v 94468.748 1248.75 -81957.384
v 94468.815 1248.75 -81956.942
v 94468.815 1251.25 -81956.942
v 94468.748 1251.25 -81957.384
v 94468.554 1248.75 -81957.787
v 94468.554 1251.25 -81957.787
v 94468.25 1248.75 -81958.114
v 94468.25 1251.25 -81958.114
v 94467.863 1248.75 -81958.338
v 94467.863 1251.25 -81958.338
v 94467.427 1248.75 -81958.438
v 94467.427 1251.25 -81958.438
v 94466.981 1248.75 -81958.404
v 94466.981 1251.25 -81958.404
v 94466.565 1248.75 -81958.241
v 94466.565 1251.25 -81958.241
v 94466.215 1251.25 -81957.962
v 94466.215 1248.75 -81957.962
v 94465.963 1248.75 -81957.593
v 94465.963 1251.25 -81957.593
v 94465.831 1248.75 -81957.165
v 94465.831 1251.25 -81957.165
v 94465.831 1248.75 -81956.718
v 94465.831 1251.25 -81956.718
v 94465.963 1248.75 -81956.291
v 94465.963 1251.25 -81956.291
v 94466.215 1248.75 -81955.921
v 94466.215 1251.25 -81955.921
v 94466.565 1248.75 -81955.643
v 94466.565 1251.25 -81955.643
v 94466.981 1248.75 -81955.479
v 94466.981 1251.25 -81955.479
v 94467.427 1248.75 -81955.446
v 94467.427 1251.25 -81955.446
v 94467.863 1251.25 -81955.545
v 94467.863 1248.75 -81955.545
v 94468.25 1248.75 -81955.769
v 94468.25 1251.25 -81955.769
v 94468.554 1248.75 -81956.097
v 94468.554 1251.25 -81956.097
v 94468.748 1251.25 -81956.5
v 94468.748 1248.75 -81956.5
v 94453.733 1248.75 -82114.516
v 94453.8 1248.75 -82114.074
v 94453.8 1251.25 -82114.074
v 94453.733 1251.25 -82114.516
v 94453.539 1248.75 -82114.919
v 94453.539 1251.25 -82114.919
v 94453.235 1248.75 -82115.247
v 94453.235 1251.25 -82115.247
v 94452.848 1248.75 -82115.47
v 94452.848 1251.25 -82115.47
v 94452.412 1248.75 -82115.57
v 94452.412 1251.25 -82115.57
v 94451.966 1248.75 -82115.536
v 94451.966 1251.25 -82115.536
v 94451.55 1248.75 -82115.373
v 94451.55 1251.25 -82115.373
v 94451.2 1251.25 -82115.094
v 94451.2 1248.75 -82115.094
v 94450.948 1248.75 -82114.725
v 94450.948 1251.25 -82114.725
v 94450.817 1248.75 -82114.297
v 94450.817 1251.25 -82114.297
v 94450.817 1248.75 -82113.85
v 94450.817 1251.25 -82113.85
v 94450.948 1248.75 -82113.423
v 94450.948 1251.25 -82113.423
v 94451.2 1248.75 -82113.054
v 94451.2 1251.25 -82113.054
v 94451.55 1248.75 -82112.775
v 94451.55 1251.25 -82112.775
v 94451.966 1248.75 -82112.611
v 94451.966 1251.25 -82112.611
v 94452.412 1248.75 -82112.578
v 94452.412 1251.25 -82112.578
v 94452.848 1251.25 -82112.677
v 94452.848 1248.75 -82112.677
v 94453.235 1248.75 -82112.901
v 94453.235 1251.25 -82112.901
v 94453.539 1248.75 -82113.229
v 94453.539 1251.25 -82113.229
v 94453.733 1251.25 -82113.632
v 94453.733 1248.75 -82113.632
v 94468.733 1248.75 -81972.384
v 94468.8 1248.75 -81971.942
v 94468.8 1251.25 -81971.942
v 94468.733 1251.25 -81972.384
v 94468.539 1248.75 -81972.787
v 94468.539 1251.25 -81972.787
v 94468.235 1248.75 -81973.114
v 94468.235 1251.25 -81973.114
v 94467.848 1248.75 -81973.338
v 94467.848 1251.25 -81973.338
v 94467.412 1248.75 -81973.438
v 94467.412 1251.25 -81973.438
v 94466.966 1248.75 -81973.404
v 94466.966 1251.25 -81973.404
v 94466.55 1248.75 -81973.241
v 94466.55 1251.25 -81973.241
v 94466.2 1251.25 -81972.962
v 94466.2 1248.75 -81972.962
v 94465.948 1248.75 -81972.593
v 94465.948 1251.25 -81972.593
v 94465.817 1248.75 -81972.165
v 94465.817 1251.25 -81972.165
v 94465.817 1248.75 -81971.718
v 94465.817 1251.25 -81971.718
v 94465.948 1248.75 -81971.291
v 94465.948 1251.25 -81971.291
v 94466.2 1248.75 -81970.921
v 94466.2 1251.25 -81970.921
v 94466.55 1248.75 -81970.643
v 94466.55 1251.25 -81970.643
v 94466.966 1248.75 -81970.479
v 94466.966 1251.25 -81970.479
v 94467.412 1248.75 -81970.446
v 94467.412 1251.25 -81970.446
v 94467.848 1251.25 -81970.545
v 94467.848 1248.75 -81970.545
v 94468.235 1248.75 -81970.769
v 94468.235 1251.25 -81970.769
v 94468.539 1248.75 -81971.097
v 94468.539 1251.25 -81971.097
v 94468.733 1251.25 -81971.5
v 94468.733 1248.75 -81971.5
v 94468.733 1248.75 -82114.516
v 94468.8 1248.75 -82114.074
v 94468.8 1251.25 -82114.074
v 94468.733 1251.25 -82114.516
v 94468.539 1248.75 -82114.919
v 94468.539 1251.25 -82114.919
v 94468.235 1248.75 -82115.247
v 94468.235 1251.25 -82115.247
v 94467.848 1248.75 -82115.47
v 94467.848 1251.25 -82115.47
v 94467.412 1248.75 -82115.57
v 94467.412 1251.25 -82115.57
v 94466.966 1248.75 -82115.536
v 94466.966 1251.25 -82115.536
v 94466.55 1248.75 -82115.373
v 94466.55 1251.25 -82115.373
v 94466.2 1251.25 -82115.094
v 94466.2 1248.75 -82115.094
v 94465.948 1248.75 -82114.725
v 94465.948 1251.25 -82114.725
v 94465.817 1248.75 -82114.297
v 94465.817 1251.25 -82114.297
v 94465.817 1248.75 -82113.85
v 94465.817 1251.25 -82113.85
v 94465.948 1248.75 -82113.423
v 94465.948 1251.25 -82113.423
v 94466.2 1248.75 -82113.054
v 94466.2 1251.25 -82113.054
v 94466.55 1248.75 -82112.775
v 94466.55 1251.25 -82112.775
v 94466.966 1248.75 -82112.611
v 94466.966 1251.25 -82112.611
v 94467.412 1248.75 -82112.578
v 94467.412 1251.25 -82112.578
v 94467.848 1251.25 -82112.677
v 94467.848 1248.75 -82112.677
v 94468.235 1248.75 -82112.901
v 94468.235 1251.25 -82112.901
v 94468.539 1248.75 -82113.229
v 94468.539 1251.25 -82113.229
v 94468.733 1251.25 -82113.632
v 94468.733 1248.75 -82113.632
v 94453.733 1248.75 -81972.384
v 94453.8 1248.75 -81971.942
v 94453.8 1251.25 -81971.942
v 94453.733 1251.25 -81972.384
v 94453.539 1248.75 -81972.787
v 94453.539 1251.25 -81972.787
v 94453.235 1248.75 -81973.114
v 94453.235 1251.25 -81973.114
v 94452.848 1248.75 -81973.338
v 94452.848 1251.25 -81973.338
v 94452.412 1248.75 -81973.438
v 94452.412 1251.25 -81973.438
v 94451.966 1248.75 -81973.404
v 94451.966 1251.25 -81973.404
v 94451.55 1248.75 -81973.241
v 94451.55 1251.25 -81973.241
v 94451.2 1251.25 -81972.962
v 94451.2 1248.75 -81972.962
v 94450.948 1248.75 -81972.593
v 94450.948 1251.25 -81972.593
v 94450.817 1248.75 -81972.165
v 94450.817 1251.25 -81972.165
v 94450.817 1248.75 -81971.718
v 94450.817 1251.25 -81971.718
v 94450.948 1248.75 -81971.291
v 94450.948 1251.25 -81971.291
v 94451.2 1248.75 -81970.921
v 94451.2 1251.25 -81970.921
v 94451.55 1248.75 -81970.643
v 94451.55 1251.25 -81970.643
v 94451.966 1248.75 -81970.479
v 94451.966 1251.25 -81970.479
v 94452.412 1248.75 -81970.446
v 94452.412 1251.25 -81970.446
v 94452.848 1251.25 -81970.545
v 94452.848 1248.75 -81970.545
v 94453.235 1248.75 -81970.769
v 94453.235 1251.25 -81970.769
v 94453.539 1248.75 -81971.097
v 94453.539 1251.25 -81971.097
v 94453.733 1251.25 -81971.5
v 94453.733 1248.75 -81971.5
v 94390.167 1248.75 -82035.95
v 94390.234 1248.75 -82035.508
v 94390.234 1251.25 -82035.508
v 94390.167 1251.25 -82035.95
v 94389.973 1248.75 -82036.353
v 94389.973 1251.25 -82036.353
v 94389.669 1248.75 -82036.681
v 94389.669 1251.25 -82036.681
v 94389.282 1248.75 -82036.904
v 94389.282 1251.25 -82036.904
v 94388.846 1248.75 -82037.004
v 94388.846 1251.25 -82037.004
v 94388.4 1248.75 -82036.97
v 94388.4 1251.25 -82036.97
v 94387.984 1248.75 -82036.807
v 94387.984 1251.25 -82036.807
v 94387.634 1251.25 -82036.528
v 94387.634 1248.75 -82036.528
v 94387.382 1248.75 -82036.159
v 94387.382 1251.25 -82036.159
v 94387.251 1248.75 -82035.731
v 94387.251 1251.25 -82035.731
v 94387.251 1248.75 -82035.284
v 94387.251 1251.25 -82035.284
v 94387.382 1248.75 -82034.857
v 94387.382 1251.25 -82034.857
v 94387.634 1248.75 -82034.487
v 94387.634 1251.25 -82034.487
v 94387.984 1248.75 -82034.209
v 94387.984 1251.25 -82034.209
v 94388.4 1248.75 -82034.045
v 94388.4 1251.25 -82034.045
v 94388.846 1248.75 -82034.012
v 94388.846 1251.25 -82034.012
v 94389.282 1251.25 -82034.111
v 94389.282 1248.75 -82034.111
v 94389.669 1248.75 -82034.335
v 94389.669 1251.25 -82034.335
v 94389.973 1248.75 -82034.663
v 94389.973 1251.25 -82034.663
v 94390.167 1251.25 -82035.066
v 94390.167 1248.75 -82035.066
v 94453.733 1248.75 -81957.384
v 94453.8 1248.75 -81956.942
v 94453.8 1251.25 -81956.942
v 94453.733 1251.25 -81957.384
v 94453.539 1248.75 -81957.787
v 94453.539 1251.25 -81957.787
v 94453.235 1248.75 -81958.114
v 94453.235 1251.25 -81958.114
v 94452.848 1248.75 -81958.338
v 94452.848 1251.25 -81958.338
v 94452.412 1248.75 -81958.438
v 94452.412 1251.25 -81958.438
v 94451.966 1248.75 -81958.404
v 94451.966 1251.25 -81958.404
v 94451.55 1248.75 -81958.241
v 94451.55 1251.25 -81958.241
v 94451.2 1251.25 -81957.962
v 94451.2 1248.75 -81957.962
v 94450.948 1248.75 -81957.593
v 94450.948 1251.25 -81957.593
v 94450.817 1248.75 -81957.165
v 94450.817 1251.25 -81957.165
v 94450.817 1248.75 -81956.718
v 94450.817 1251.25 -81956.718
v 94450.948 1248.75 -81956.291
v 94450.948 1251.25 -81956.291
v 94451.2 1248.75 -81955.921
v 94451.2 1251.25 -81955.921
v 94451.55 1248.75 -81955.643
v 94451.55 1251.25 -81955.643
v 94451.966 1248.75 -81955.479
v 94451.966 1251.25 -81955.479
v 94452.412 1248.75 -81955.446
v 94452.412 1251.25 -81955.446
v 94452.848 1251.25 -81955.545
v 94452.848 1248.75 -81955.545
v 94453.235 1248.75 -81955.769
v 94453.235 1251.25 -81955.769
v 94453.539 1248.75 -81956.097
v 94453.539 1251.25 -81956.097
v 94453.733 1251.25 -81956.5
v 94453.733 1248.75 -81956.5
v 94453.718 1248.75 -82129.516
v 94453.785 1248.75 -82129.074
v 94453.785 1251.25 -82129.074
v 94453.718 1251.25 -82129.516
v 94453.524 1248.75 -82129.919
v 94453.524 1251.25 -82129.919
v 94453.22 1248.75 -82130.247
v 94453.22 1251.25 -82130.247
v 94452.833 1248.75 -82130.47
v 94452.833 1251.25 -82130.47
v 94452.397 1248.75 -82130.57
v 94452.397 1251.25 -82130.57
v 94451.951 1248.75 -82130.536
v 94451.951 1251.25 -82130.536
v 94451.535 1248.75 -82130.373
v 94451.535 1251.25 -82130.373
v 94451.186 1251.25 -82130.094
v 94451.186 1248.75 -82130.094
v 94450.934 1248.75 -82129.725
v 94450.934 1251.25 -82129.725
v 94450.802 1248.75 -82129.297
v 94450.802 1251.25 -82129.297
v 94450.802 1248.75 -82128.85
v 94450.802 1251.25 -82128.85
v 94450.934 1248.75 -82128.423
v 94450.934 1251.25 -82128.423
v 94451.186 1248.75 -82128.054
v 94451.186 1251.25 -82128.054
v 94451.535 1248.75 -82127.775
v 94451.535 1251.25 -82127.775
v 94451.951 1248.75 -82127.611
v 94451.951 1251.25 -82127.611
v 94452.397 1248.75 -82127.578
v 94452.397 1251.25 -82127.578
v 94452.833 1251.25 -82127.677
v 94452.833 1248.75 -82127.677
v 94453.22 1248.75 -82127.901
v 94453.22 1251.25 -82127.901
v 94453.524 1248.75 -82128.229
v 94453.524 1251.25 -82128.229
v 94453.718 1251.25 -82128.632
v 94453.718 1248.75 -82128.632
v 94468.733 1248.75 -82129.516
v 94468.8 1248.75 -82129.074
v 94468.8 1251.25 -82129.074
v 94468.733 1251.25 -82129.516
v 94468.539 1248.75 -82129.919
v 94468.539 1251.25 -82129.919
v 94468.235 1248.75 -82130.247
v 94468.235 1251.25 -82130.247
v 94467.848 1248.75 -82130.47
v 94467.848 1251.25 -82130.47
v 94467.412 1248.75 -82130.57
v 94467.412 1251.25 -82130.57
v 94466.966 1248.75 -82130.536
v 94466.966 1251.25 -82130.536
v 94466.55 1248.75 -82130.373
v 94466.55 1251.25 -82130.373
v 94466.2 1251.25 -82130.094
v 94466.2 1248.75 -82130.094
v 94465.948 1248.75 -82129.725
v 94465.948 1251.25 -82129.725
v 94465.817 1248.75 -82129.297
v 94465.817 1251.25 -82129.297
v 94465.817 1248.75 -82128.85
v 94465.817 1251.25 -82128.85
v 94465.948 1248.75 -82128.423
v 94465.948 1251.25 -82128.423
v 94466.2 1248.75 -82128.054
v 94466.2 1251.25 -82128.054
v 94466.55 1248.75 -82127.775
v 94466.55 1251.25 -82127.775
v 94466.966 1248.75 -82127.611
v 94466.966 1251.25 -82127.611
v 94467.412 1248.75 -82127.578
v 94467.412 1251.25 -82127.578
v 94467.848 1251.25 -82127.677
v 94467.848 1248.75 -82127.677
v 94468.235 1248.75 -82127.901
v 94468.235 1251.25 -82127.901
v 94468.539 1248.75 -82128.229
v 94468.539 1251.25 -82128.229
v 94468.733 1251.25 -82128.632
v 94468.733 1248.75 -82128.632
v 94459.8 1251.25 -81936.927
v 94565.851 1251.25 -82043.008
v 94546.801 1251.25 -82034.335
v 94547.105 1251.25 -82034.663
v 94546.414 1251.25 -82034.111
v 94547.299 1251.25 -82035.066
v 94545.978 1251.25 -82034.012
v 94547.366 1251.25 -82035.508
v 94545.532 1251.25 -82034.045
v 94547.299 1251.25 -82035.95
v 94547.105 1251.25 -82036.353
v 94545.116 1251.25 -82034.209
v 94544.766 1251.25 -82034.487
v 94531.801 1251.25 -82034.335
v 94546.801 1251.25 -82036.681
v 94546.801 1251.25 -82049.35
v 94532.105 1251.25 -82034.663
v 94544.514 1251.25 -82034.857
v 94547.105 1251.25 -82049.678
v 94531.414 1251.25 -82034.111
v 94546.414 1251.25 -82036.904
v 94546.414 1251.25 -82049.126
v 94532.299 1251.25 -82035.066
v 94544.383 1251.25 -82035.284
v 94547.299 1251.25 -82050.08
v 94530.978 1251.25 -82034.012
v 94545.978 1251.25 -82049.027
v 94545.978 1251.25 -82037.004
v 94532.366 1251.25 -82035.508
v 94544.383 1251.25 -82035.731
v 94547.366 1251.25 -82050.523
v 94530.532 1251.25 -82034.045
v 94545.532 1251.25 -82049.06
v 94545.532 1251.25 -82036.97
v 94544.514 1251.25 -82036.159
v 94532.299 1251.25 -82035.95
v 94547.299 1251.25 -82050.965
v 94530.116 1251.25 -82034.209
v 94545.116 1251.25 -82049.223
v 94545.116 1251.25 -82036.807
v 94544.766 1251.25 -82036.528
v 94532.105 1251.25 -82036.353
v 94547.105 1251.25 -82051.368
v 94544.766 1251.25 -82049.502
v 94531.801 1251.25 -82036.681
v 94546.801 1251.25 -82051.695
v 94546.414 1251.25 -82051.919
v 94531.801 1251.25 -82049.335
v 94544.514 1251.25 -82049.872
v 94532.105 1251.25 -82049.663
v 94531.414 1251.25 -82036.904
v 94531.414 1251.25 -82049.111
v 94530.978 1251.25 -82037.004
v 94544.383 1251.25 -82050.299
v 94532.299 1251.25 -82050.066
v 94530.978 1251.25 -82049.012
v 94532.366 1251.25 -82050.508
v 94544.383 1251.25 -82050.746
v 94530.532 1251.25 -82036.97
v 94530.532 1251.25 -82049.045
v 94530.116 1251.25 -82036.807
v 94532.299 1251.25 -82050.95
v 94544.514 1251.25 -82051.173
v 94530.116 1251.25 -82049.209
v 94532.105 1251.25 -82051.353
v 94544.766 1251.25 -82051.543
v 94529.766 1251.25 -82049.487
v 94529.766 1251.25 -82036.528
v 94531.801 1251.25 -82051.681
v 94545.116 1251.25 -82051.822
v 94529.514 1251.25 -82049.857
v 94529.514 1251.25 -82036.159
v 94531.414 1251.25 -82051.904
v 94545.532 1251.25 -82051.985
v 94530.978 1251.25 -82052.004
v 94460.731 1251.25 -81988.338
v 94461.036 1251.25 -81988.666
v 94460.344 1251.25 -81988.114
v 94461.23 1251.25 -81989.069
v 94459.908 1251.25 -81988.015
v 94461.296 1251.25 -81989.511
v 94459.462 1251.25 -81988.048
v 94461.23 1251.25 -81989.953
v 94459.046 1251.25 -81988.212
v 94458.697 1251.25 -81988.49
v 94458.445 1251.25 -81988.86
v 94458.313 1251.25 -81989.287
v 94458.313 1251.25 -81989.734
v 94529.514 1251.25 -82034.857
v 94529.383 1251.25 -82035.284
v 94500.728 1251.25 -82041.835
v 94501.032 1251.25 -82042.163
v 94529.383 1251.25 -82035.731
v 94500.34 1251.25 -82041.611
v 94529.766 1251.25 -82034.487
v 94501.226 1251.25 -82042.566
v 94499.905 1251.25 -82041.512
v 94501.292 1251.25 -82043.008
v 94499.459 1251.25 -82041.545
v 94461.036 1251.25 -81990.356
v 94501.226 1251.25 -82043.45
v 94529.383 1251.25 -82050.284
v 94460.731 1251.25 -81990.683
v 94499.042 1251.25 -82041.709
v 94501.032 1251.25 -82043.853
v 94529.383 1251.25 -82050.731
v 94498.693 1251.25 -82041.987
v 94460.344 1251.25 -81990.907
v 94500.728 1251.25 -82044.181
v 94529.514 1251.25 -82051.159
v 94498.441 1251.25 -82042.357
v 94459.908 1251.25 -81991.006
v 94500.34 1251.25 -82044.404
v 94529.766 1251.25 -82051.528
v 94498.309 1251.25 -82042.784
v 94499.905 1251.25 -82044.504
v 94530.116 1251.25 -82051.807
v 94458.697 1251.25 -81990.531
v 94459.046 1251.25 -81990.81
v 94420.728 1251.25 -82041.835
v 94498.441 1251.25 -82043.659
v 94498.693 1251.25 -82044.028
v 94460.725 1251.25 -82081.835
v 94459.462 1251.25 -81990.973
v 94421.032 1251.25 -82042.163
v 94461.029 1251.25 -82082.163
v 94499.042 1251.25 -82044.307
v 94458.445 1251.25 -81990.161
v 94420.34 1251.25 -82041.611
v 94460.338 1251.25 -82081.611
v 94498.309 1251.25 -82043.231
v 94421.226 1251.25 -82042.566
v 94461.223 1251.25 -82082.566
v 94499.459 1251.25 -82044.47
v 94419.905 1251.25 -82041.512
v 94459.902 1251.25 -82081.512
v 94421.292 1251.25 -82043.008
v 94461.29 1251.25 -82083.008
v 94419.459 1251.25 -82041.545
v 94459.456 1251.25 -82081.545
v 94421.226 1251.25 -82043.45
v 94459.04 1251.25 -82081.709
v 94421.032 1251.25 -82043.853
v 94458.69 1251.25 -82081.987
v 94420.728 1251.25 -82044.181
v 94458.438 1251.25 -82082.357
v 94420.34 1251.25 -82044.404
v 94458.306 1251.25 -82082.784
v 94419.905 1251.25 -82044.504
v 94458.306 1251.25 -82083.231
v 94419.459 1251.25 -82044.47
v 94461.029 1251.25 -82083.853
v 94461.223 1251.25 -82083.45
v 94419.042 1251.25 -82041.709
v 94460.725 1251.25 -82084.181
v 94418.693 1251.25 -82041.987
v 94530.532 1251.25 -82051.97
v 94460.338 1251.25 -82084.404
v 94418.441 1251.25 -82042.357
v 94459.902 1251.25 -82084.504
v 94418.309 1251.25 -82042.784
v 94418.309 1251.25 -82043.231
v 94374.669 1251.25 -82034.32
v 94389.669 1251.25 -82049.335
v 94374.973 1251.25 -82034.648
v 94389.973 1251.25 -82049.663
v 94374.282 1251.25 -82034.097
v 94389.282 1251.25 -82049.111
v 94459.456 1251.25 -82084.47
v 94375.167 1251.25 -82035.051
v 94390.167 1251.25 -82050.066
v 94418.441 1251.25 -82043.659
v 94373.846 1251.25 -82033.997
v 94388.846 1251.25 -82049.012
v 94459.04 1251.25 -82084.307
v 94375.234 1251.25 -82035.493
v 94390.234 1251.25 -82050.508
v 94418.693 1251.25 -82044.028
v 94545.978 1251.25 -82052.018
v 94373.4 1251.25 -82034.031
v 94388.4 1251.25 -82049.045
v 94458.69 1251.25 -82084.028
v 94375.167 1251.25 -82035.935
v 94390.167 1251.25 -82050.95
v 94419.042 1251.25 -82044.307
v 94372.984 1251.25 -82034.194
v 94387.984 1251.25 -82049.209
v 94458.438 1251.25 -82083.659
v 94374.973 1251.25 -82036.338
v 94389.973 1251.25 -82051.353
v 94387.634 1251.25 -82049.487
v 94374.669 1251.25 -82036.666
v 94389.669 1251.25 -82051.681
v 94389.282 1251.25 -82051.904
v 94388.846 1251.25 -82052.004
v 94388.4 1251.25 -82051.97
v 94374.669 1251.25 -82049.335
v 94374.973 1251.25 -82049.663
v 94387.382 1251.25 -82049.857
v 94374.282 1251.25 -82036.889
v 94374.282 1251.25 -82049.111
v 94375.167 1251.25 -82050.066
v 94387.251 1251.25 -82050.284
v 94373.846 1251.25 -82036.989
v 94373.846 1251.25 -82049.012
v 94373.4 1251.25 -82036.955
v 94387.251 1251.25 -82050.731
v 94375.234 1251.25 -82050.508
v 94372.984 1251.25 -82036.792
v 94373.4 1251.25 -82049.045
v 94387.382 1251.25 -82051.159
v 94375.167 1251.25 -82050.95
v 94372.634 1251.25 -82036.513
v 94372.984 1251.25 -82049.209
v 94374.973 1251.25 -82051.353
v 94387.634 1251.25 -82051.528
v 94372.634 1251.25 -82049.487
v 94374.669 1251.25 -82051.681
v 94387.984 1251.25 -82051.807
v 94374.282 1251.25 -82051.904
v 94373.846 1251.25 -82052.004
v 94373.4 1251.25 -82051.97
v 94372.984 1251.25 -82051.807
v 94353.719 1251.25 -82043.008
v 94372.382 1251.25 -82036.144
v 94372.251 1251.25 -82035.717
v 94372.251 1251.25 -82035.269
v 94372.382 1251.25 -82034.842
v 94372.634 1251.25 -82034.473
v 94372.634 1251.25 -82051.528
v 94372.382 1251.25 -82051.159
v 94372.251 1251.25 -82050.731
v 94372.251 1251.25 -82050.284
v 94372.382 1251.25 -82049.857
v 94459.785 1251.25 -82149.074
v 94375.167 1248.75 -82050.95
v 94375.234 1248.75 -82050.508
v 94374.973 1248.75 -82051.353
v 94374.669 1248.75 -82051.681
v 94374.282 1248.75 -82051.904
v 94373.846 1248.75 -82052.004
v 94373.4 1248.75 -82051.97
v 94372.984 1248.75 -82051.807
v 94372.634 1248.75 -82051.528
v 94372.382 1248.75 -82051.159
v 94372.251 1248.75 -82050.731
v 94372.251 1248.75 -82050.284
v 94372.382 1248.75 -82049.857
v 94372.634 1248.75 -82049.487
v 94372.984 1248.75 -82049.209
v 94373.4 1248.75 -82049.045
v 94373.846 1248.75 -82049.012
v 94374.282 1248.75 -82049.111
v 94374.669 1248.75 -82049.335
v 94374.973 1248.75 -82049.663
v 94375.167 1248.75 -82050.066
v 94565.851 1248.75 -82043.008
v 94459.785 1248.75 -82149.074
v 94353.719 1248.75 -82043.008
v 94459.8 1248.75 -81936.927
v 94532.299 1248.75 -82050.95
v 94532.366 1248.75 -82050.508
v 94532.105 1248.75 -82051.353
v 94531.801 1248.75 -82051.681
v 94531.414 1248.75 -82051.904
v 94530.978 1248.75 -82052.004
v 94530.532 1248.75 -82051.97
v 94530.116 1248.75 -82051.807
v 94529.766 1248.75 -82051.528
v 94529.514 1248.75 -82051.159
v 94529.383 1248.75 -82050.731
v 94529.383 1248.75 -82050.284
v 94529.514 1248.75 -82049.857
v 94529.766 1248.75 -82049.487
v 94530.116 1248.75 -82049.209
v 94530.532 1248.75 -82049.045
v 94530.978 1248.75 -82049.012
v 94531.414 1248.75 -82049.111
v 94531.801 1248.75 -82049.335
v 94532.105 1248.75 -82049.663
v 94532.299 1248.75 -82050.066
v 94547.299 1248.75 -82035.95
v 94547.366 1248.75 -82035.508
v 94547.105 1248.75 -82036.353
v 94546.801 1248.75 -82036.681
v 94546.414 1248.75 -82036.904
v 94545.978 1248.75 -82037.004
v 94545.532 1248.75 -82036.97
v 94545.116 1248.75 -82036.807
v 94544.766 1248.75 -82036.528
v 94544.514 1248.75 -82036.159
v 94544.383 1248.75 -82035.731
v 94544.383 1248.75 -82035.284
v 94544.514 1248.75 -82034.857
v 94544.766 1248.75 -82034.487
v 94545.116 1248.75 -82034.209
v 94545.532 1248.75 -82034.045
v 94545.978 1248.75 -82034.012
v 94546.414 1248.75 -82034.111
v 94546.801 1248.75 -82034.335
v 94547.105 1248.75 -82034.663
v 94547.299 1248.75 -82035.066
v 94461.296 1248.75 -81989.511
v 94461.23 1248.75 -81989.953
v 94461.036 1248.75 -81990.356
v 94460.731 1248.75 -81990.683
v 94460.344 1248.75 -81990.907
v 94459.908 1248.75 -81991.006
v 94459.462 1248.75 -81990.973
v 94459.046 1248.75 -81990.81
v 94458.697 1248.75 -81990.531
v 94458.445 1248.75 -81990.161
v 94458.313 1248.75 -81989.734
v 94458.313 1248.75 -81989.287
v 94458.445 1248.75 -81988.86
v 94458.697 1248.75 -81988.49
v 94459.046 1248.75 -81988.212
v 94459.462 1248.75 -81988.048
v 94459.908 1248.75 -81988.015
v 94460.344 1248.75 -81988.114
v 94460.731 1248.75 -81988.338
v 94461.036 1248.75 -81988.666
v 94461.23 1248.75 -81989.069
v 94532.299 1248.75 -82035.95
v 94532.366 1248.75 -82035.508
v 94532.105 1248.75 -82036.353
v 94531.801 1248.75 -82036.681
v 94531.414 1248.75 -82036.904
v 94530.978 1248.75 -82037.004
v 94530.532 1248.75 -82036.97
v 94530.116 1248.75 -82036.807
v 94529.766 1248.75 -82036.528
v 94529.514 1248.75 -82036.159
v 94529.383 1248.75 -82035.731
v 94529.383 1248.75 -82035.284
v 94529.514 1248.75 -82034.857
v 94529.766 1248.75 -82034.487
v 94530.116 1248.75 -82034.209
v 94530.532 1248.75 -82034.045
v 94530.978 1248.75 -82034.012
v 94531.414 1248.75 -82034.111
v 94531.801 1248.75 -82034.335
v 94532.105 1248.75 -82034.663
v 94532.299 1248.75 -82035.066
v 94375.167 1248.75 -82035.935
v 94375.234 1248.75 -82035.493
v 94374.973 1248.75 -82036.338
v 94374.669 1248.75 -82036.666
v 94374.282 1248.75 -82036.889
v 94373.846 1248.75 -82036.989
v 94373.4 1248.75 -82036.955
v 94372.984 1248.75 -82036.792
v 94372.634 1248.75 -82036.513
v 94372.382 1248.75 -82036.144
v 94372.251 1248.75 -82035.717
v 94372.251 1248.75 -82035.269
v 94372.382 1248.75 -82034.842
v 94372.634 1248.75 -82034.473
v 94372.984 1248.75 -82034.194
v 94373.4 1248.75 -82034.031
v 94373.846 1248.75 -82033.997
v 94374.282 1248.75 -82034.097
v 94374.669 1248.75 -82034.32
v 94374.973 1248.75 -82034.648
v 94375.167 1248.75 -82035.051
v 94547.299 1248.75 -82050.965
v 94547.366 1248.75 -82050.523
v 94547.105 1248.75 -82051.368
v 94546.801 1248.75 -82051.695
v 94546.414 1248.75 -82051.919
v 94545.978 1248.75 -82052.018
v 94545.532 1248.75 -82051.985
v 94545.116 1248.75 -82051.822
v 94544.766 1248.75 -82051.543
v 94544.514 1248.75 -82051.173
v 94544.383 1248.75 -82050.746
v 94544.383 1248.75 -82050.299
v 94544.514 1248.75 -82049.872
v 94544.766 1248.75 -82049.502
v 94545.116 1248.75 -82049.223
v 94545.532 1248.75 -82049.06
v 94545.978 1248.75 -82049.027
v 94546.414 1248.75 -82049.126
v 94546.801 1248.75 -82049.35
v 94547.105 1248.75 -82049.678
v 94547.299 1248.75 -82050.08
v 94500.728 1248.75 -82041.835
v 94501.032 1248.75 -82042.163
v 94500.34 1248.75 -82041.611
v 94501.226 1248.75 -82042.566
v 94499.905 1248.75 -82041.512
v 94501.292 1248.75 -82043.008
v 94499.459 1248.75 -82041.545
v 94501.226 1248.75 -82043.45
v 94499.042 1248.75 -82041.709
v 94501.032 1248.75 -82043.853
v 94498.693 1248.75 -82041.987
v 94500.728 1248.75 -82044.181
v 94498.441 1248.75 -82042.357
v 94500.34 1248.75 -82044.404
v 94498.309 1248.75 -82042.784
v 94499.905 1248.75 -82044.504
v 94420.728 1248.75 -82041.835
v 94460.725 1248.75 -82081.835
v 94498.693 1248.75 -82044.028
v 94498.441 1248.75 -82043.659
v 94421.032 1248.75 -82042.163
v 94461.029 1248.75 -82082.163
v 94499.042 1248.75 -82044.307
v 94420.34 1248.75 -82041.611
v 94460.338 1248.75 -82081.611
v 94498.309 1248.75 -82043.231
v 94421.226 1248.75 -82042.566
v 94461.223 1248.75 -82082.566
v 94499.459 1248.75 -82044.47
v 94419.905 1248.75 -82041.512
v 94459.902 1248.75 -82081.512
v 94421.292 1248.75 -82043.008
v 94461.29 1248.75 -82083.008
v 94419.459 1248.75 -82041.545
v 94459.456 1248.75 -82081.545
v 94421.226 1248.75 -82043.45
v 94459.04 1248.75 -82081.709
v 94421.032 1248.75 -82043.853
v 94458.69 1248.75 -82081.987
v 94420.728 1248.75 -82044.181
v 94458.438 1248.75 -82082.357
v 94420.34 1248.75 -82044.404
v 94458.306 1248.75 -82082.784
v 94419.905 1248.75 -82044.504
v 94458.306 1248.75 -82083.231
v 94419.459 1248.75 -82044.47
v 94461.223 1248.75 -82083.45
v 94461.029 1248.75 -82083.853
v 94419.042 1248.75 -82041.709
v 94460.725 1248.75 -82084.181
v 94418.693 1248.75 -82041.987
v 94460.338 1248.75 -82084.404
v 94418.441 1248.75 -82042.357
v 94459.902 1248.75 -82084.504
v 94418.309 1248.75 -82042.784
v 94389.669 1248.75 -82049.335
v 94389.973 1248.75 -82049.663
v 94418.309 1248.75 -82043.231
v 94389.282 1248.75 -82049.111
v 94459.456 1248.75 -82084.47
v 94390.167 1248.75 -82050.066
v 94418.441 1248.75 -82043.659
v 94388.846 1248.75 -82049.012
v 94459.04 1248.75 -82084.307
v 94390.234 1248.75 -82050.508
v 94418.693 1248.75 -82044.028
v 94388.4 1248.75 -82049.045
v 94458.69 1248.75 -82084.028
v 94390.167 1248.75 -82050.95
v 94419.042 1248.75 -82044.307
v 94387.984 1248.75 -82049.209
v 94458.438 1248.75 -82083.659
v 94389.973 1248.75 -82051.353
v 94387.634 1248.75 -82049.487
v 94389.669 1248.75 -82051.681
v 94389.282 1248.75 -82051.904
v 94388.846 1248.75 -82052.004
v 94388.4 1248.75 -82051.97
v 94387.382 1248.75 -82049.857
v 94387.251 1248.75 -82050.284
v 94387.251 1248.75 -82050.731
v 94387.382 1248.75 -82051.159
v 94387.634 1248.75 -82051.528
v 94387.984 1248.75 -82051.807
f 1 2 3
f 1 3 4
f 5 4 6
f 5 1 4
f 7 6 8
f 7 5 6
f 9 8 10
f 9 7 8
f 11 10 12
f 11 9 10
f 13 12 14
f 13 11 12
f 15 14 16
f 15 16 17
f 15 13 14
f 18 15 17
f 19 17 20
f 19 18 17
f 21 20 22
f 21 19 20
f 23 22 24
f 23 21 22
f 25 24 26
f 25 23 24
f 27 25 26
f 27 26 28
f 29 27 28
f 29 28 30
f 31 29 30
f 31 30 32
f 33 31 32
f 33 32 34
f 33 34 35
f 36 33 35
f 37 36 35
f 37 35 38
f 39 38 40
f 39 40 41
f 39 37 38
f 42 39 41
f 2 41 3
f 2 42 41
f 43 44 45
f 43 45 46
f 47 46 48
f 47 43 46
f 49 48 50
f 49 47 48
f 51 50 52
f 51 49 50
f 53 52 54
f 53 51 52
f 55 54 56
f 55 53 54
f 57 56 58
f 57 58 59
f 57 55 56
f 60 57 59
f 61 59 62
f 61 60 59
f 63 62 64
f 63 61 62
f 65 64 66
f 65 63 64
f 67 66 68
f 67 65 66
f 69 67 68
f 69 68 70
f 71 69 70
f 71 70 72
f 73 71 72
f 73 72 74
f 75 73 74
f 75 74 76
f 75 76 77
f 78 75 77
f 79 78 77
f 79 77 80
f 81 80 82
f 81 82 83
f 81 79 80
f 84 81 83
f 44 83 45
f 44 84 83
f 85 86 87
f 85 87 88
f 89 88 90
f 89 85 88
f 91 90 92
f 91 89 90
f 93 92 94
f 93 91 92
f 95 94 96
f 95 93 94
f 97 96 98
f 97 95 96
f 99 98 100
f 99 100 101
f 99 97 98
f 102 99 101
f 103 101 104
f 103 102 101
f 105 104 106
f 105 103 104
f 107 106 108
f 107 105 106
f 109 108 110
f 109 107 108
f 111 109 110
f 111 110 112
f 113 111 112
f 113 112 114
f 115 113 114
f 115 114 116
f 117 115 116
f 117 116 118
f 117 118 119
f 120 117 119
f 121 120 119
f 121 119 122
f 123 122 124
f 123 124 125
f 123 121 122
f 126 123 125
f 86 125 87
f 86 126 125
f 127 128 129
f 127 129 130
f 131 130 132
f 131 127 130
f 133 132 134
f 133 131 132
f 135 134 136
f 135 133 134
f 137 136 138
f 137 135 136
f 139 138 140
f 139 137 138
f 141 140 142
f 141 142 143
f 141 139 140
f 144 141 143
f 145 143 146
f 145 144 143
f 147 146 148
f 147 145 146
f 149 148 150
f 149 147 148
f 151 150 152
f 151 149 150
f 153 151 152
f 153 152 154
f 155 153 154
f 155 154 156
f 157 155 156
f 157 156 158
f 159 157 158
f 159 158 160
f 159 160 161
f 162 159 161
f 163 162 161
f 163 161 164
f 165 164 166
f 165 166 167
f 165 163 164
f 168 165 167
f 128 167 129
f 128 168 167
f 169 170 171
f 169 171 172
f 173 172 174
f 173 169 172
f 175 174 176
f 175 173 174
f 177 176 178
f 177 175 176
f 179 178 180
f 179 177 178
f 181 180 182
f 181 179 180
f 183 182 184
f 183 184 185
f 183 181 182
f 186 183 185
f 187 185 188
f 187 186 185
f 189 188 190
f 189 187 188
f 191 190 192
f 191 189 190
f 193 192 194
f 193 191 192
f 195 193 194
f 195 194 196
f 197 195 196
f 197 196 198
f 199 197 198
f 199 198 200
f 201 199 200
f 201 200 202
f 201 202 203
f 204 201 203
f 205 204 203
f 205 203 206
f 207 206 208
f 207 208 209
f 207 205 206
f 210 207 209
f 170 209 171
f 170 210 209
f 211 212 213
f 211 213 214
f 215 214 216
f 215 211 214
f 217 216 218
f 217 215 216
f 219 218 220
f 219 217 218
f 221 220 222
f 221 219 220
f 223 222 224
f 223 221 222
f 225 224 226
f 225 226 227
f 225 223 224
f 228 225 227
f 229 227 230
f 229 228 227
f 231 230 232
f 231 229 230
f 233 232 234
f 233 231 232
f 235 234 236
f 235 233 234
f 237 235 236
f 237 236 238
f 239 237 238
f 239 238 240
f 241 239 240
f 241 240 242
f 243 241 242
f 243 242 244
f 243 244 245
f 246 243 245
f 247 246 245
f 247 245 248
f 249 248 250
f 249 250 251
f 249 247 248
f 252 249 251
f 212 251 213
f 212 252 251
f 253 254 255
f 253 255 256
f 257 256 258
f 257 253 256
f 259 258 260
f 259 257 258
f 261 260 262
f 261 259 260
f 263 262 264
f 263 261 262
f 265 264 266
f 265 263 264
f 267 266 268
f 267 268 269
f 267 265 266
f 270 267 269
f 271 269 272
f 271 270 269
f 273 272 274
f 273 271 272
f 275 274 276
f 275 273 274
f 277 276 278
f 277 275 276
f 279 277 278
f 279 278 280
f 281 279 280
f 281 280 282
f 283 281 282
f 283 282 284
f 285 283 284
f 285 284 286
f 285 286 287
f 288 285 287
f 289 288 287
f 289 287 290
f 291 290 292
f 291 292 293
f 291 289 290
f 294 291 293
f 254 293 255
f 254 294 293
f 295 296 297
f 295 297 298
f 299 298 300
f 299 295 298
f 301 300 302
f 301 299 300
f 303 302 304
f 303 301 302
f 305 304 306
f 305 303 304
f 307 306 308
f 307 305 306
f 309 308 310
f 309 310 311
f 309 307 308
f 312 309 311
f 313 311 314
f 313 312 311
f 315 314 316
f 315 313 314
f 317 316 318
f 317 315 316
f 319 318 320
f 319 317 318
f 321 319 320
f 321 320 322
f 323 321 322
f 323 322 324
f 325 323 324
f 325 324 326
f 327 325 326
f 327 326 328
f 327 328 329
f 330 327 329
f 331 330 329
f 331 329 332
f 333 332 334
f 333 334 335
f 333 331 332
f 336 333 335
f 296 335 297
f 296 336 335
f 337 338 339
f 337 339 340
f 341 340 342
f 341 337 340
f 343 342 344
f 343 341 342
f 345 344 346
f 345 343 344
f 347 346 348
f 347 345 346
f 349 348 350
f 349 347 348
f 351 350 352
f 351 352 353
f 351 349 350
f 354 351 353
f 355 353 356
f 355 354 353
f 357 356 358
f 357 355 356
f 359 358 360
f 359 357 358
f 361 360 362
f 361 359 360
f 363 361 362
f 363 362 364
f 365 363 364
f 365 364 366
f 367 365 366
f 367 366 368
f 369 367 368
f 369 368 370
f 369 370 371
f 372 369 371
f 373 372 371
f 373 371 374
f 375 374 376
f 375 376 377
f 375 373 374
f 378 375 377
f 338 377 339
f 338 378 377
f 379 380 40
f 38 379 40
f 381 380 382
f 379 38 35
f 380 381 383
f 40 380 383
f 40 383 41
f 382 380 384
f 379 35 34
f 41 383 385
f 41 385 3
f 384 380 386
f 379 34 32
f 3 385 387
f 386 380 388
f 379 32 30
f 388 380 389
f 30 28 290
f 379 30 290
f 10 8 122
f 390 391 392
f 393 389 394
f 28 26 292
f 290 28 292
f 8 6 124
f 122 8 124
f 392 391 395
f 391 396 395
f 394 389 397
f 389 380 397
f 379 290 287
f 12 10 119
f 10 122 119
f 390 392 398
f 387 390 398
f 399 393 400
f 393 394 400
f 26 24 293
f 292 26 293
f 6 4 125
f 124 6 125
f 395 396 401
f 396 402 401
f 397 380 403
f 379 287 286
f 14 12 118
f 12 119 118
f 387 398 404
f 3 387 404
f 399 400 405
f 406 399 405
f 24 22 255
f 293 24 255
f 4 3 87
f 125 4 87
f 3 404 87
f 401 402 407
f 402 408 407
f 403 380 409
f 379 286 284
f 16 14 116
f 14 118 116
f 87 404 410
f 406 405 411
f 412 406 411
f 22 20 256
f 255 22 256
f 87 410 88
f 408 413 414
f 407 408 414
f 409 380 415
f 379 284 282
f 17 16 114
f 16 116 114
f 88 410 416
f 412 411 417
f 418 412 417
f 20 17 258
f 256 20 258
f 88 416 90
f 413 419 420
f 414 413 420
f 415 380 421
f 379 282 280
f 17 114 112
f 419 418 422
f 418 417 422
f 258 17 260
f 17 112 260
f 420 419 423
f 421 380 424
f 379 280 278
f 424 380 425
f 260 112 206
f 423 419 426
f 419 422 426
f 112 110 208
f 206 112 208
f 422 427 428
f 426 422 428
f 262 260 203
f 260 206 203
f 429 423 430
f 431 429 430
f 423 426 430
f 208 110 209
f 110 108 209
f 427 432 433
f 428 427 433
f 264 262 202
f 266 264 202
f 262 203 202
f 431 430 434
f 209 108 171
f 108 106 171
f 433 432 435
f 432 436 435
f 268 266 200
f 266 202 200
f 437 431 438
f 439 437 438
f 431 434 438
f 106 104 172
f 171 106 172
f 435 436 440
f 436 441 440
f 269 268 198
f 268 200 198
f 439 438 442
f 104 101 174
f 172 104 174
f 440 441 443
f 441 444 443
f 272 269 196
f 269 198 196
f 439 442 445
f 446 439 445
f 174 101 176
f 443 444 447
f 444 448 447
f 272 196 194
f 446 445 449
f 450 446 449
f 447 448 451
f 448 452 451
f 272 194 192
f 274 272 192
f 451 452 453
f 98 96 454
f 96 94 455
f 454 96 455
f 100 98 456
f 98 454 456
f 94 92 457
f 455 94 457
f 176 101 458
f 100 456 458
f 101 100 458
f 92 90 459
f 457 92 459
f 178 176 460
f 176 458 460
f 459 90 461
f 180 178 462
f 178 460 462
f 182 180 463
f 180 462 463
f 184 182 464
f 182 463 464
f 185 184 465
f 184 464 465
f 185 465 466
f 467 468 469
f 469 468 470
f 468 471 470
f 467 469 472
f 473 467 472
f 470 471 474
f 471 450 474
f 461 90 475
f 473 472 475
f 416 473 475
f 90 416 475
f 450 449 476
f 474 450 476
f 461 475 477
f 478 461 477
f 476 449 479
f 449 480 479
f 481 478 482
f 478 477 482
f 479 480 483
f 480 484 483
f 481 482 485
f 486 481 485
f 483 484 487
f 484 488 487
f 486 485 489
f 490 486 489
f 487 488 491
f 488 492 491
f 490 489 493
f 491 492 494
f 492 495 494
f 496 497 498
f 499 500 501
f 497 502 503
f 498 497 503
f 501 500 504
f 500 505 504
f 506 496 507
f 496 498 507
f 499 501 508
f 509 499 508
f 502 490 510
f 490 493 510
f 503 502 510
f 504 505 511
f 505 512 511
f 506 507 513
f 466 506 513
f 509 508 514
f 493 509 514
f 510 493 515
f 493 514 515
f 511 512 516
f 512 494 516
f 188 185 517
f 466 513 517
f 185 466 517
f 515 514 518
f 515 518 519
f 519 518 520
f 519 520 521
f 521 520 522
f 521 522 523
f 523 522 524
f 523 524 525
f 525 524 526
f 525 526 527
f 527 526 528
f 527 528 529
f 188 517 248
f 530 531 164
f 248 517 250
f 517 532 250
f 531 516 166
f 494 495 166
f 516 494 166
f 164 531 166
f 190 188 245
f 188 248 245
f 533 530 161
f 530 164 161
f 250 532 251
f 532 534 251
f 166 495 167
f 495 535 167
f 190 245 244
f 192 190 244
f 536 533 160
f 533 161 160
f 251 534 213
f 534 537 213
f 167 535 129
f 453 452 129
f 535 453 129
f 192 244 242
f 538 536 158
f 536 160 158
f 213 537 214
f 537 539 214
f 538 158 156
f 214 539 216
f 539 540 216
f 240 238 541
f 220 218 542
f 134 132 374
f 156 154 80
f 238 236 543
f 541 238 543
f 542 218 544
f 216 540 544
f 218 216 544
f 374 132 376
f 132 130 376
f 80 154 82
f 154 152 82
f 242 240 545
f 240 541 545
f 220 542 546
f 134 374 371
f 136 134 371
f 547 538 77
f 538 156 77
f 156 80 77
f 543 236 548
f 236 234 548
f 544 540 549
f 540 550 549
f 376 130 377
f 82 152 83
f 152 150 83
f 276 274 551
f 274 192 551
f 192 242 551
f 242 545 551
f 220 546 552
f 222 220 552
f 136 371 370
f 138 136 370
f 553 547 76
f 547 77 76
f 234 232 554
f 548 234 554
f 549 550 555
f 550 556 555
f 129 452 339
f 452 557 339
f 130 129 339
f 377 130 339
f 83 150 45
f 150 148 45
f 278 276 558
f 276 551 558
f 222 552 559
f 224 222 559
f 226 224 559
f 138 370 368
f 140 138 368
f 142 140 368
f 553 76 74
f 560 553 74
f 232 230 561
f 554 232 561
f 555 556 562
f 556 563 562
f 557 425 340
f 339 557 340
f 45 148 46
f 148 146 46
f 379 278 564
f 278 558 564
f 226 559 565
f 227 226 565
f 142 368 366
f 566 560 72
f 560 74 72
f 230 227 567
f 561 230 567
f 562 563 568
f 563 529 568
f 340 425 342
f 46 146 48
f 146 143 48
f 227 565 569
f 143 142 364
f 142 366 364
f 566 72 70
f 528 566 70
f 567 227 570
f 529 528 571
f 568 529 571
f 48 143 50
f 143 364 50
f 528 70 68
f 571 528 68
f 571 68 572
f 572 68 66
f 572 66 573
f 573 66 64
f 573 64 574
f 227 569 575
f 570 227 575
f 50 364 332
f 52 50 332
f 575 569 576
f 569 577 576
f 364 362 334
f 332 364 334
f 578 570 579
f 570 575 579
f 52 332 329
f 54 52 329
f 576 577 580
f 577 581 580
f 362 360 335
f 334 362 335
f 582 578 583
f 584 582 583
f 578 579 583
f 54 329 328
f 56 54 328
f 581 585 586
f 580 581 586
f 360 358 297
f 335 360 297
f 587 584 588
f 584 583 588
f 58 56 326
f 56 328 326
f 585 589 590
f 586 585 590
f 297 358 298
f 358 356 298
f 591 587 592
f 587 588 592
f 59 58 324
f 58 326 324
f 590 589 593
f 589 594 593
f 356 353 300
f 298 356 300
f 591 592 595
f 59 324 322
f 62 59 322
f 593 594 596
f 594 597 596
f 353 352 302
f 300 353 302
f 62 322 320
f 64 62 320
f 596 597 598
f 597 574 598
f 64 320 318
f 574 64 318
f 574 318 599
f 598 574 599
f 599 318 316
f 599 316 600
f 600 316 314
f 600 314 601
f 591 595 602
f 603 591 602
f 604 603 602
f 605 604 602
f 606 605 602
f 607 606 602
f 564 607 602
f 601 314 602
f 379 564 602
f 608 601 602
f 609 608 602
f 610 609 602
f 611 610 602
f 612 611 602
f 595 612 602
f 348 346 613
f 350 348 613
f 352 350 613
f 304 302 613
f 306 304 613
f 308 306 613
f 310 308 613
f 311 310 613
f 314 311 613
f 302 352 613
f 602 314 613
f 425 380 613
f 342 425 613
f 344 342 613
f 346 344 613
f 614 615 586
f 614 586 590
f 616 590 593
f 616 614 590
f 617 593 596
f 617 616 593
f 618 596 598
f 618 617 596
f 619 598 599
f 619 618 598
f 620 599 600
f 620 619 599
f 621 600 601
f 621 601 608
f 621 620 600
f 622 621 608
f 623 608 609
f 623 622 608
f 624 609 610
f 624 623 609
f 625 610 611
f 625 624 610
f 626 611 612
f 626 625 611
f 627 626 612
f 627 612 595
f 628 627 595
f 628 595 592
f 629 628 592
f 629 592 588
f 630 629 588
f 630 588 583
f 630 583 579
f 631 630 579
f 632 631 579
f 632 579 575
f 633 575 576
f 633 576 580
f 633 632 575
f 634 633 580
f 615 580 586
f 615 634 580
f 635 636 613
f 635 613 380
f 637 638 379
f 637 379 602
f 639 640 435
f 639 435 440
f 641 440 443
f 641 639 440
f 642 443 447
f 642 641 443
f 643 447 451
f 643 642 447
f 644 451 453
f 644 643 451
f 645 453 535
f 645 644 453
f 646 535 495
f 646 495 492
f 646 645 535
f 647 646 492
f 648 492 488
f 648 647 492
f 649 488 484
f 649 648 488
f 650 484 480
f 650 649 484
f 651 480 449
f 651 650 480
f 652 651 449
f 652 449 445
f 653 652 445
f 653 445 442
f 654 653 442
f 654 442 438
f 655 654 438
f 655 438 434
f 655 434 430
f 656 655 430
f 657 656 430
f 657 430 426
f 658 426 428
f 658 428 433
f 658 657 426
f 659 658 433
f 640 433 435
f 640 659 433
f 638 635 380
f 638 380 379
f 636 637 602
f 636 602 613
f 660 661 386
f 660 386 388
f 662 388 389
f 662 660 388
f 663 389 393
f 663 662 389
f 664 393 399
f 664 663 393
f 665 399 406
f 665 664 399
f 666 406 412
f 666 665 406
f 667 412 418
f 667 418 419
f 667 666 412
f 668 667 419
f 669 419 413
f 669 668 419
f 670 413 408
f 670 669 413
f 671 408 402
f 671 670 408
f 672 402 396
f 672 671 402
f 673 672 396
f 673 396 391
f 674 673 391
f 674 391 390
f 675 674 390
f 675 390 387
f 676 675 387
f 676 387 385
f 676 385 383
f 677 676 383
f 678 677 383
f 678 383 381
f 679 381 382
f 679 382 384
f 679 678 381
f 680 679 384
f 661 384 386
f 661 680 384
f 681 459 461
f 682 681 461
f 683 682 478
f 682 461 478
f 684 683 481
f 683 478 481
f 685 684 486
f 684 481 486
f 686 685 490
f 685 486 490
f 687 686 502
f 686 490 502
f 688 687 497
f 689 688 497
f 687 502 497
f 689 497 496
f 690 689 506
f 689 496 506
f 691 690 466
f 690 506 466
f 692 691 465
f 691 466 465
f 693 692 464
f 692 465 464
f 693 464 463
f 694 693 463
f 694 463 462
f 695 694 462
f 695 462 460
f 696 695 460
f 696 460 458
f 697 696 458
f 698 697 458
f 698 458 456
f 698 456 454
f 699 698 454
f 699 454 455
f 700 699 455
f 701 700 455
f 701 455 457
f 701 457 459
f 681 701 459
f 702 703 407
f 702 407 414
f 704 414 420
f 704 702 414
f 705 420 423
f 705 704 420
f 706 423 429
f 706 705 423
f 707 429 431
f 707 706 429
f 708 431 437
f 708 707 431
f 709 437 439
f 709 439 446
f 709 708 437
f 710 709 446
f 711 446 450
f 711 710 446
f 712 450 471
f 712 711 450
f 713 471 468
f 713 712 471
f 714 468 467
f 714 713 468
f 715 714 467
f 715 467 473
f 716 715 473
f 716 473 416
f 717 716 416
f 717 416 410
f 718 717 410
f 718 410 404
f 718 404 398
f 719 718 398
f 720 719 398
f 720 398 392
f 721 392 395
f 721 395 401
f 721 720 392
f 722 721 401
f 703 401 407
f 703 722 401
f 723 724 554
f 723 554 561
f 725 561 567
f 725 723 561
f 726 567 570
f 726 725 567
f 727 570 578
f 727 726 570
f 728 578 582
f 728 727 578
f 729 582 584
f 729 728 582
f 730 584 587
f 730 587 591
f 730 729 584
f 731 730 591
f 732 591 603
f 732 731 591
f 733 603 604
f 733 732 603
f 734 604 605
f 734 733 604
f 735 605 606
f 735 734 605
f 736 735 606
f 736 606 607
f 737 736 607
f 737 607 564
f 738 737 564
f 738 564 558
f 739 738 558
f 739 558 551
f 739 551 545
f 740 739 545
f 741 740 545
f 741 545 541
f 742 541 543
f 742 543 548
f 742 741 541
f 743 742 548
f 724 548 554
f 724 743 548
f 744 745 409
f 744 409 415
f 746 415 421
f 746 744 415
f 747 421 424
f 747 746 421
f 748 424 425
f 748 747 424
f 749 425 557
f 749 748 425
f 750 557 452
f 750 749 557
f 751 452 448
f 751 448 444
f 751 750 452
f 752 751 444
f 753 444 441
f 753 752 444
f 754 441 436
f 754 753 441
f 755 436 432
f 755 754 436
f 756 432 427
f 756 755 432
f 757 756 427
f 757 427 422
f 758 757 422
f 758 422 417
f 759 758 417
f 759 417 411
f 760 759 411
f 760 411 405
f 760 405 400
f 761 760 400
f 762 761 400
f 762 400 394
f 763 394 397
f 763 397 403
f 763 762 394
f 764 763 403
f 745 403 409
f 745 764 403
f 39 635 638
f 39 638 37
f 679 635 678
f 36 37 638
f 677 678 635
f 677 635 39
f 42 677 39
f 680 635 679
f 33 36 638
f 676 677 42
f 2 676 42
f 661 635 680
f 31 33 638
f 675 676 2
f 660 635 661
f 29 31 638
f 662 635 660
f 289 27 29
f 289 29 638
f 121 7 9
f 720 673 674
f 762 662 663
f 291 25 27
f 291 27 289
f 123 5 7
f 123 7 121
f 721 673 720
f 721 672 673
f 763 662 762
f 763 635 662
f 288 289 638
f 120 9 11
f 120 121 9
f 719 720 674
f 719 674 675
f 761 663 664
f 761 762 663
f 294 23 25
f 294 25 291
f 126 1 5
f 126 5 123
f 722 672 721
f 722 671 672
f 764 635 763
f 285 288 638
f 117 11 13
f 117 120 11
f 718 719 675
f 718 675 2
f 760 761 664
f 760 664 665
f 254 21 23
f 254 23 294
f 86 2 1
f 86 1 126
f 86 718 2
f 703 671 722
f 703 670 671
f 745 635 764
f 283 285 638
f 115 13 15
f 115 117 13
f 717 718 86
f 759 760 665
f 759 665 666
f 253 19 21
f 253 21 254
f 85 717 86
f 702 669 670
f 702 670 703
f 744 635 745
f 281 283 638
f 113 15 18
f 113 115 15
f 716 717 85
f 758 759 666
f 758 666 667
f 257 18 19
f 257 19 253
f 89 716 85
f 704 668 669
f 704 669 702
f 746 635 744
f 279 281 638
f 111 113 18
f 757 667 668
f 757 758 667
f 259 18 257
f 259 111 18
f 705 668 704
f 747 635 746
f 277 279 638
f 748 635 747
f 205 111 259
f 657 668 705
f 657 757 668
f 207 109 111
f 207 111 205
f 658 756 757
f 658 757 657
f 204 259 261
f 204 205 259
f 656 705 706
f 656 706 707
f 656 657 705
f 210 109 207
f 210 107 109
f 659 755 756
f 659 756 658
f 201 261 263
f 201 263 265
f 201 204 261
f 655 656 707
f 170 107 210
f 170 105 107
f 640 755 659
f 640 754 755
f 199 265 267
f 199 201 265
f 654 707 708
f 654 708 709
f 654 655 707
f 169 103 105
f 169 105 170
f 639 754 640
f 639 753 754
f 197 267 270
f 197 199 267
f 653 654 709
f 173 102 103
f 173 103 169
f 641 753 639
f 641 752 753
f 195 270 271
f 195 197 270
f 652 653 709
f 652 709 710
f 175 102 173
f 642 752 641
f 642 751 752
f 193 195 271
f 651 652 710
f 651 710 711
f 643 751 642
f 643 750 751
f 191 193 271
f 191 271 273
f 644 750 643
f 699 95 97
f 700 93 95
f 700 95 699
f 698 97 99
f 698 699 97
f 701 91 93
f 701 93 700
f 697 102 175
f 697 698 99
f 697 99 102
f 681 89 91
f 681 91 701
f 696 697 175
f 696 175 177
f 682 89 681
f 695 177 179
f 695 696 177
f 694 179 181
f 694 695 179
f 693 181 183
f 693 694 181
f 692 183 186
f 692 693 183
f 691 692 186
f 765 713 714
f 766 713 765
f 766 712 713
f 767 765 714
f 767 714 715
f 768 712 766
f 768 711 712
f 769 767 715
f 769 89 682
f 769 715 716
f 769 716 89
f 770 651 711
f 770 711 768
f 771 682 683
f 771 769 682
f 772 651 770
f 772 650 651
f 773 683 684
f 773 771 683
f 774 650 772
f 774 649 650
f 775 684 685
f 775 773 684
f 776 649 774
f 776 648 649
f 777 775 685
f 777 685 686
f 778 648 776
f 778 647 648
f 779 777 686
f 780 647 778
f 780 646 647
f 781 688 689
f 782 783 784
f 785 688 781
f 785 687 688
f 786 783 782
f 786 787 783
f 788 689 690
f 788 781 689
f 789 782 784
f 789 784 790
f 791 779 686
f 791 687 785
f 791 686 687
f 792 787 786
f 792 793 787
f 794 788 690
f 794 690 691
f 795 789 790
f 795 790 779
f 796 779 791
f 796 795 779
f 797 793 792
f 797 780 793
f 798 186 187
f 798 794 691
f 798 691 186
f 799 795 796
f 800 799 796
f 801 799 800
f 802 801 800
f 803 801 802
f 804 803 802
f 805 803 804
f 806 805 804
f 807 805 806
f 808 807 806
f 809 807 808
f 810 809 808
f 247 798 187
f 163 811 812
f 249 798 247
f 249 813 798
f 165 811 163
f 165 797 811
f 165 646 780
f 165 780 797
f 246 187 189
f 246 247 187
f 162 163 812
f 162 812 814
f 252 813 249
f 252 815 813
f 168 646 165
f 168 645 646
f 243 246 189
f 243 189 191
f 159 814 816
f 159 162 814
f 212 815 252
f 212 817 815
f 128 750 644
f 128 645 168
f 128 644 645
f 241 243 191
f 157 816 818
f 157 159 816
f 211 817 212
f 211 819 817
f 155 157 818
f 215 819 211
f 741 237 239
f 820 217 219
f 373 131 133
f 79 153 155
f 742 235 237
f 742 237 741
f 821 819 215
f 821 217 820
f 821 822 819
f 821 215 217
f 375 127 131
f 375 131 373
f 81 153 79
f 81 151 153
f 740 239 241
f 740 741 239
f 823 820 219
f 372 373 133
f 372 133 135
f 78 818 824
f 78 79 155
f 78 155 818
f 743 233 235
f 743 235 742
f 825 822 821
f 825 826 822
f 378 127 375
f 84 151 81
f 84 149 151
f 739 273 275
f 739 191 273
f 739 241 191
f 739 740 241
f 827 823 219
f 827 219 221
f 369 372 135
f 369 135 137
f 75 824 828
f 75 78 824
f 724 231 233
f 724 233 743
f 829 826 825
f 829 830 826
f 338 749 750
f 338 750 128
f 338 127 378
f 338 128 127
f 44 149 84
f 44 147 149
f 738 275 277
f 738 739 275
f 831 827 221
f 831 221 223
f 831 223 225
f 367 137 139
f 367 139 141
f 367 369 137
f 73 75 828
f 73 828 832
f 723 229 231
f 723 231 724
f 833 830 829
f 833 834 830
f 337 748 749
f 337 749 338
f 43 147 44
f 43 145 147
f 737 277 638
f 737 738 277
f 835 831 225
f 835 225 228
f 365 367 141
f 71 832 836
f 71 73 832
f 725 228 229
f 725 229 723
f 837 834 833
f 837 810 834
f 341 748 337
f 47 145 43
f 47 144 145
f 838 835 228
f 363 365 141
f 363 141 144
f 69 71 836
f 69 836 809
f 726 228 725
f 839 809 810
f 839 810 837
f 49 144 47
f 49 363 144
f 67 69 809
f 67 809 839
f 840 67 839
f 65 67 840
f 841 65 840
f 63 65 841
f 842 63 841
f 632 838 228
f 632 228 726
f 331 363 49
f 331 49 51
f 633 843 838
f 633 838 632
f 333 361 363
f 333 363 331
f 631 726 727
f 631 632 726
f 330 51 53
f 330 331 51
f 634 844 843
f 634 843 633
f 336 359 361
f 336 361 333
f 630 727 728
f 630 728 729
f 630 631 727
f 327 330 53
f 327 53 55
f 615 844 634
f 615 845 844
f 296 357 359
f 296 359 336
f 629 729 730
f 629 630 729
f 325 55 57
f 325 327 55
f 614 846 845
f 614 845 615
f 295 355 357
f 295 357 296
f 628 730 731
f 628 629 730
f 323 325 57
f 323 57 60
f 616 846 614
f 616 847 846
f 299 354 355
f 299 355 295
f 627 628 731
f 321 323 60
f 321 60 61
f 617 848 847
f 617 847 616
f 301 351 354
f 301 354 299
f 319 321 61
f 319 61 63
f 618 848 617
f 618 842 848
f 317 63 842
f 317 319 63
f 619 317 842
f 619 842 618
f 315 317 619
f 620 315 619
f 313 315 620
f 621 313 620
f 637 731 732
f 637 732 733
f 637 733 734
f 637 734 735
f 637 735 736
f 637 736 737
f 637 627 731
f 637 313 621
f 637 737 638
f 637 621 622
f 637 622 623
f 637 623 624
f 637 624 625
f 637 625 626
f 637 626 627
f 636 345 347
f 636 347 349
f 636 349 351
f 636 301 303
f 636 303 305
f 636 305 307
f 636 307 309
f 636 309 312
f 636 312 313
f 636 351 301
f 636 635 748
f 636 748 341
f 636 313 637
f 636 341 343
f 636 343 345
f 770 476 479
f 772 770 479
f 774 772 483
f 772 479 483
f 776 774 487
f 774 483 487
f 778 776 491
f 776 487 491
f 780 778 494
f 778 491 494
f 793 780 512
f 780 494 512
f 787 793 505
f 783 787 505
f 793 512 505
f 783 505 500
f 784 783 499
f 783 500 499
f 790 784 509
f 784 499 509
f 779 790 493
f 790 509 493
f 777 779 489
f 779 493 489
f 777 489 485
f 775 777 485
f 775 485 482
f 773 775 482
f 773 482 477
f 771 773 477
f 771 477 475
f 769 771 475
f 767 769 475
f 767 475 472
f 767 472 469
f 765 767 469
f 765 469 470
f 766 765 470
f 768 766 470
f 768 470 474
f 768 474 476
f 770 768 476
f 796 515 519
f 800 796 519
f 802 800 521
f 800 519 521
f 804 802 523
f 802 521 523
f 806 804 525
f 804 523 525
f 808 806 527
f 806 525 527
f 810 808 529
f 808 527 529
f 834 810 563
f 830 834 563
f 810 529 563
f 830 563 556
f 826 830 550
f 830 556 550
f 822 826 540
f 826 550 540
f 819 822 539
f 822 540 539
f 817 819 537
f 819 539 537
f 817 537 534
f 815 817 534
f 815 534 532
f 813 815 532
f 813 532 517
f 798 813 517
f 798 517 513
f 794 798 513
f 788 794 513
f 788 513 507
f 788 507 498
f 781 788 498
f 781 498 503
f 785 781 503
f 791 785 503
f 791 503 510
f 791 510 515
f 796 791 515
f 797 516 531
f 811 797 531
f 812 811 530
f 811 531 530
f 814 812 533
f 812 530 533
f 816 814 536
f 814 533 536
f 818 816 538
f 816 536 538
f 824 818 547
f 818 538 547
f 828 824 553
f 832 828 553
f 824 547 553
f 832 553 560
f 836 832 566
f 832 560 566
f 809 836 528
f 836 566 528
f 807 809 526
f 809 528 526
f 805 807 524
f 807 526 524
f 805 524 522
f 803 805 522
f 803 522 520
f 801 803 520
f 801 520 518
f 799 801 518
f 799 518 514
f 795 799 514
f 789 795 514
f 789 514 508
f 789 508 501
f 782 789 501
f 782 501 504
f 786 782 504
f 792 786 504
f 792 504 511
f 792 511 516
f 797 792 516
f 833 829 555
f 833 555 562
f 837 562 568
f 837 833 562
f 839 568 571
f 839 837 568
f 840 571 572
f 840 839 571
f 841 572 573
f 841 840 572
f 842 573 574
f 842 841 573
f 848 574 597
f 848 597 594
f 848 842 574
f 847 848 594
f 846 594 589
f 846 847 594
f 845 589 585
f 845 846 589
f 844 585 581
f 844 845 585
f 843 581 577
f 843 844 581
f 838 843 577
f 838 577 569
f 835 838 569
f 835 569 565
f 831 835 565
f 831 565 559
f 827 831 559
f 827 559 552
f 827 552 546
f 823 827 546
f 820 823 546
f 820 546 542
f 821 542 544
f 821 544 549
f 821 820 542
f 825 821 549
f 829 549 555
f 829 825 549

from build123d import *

# Parameters (mm, degrees)
SKETCH3_R           = 1500
BOSS_EXTRUDE2_DEPTH = 2500
SKETCH4_R           = 1500
CUT_EXTRUDE4_DEPTH  = 5000
SCALE1_SCALE        = 0.001


with BuildPart() as part:
    # Sketch3 → Boss-Extrude2 (new body)
    with BuildSketch(Plane(origin=(0, 0, 0), x_dir=(1, 0, 0), z_dir=(0, 1, 0))):
        Polygon((94457.392609736, 188109.713508362), (200523.409787719, 82043.696330379), (94472.169284797, -24037.095464325), (-11608.622509908, 82043.696330379), align=None)
        with Locations((23406.152106819, 74543.696330375)):
            Circle(SKETCH3_R, mode=Mode.SUBTRACT)
        with Locations((8406.152106819, 89543.696330375)):
            Circle(SKETCH3_R, mode=Mode.SUBTRACT)
        with Locations((8406.152106819, 74528.921713652)):
            Circle(SKETCH3_R, mode=Mode.SUBTRACT)
        with Locations((101972.169284806, 10977.679152396)):
            Circle(SKETCH3_R, mode=Mode.SUBTRACT)
        with Locations((86972.169284806, -4022.320847604)):
            Circle(SKETCH3_R, mode=Mode.SUBTRACT)
        with Locations((101986.943901529, -4022.320847604)):
            Circle(SKETCH3_R, mode=Mode.SUBTRACT)
        with Locations((165538.186462784, 89543.696330384)):
            Circle(SKETCH3_R, mode=Mode.SUBTRACT)
        with Locations((180538.186462784, 74543.696330384)):
            Circle(SKETCH3_R, mode=Mode.SUBTRACT)
        with Locations((180538.186462784, 89558.470947106)):
            Circle(SKETCH3_R, mode=Mode.SUBTRACT)
        with Locations((23406.152106818, 89543.696330376)):
            Circle(SKETCH3_R, mode=Mode.SUBTRACT)
        with Locations((86972.169284804, 10977.679152397)):
            Circle(SKETCH3_R, mode=Mode.SUBTRACT)
        with Locations((165538.186462783, 74543.696330383)):
            Circle(SKETCH3_R, mode=Mode.SUBTRACT)
        with Locations((86972.169284797, 153109.713508362)):
            Circle(SKETCH3_R, mode=Mode.SUBTRACT)
        with Locations((101972.169284797, 153109.713508362)):
            Circle(SKETCH3_R, mode=Mode.SUBTRACT)
        with Locations((101972.169284797, 168109.713508362)):
            Circle(SKETCH3_R, mode=Mode.SUBTRACT)
        with Locations((86957.394668074, 168109.713508362)):
            Circle(SKETCH3_R, mode=Mode.SUBTRACT)
    extrude(amount=BOSS_EXTRUDE2_DEPTH)

    # Sketch4 → Cut-Extrude4 (cut)
    with BuildSketch(Plane(origin=(0, 2500, 0), x_dir=(1, 0, 0), z_dir=(0, 1, 0))):
        with Locations((94468.506668684, 28546.60944503)):
            Circle(SKETCH4_R)
        with Locations((54464.69695623, 82043.696330379)):
            Circle(SKETCH4_R)
        with Locations((94461.994310196, 122043.696330379)):
            Circle(SKETCH4_R)
        with Locations((134464.69695623, 82043.696330379)):
            Circle(SKETCH4_R)
    extrude(amount=-CUT_EXTRUDE4_DEPTH, mode=Mode.SUBTRACT)


with BuildPart() as part_1:
    # Scale1: scaled about (94459.787496469, 1250, -82043.00706731)
    add(part.part.scale(SCALE1_SCALE).moved(Location((94365.327708973, 1248.75, -81960.964060243))))


solid = part_1.part
